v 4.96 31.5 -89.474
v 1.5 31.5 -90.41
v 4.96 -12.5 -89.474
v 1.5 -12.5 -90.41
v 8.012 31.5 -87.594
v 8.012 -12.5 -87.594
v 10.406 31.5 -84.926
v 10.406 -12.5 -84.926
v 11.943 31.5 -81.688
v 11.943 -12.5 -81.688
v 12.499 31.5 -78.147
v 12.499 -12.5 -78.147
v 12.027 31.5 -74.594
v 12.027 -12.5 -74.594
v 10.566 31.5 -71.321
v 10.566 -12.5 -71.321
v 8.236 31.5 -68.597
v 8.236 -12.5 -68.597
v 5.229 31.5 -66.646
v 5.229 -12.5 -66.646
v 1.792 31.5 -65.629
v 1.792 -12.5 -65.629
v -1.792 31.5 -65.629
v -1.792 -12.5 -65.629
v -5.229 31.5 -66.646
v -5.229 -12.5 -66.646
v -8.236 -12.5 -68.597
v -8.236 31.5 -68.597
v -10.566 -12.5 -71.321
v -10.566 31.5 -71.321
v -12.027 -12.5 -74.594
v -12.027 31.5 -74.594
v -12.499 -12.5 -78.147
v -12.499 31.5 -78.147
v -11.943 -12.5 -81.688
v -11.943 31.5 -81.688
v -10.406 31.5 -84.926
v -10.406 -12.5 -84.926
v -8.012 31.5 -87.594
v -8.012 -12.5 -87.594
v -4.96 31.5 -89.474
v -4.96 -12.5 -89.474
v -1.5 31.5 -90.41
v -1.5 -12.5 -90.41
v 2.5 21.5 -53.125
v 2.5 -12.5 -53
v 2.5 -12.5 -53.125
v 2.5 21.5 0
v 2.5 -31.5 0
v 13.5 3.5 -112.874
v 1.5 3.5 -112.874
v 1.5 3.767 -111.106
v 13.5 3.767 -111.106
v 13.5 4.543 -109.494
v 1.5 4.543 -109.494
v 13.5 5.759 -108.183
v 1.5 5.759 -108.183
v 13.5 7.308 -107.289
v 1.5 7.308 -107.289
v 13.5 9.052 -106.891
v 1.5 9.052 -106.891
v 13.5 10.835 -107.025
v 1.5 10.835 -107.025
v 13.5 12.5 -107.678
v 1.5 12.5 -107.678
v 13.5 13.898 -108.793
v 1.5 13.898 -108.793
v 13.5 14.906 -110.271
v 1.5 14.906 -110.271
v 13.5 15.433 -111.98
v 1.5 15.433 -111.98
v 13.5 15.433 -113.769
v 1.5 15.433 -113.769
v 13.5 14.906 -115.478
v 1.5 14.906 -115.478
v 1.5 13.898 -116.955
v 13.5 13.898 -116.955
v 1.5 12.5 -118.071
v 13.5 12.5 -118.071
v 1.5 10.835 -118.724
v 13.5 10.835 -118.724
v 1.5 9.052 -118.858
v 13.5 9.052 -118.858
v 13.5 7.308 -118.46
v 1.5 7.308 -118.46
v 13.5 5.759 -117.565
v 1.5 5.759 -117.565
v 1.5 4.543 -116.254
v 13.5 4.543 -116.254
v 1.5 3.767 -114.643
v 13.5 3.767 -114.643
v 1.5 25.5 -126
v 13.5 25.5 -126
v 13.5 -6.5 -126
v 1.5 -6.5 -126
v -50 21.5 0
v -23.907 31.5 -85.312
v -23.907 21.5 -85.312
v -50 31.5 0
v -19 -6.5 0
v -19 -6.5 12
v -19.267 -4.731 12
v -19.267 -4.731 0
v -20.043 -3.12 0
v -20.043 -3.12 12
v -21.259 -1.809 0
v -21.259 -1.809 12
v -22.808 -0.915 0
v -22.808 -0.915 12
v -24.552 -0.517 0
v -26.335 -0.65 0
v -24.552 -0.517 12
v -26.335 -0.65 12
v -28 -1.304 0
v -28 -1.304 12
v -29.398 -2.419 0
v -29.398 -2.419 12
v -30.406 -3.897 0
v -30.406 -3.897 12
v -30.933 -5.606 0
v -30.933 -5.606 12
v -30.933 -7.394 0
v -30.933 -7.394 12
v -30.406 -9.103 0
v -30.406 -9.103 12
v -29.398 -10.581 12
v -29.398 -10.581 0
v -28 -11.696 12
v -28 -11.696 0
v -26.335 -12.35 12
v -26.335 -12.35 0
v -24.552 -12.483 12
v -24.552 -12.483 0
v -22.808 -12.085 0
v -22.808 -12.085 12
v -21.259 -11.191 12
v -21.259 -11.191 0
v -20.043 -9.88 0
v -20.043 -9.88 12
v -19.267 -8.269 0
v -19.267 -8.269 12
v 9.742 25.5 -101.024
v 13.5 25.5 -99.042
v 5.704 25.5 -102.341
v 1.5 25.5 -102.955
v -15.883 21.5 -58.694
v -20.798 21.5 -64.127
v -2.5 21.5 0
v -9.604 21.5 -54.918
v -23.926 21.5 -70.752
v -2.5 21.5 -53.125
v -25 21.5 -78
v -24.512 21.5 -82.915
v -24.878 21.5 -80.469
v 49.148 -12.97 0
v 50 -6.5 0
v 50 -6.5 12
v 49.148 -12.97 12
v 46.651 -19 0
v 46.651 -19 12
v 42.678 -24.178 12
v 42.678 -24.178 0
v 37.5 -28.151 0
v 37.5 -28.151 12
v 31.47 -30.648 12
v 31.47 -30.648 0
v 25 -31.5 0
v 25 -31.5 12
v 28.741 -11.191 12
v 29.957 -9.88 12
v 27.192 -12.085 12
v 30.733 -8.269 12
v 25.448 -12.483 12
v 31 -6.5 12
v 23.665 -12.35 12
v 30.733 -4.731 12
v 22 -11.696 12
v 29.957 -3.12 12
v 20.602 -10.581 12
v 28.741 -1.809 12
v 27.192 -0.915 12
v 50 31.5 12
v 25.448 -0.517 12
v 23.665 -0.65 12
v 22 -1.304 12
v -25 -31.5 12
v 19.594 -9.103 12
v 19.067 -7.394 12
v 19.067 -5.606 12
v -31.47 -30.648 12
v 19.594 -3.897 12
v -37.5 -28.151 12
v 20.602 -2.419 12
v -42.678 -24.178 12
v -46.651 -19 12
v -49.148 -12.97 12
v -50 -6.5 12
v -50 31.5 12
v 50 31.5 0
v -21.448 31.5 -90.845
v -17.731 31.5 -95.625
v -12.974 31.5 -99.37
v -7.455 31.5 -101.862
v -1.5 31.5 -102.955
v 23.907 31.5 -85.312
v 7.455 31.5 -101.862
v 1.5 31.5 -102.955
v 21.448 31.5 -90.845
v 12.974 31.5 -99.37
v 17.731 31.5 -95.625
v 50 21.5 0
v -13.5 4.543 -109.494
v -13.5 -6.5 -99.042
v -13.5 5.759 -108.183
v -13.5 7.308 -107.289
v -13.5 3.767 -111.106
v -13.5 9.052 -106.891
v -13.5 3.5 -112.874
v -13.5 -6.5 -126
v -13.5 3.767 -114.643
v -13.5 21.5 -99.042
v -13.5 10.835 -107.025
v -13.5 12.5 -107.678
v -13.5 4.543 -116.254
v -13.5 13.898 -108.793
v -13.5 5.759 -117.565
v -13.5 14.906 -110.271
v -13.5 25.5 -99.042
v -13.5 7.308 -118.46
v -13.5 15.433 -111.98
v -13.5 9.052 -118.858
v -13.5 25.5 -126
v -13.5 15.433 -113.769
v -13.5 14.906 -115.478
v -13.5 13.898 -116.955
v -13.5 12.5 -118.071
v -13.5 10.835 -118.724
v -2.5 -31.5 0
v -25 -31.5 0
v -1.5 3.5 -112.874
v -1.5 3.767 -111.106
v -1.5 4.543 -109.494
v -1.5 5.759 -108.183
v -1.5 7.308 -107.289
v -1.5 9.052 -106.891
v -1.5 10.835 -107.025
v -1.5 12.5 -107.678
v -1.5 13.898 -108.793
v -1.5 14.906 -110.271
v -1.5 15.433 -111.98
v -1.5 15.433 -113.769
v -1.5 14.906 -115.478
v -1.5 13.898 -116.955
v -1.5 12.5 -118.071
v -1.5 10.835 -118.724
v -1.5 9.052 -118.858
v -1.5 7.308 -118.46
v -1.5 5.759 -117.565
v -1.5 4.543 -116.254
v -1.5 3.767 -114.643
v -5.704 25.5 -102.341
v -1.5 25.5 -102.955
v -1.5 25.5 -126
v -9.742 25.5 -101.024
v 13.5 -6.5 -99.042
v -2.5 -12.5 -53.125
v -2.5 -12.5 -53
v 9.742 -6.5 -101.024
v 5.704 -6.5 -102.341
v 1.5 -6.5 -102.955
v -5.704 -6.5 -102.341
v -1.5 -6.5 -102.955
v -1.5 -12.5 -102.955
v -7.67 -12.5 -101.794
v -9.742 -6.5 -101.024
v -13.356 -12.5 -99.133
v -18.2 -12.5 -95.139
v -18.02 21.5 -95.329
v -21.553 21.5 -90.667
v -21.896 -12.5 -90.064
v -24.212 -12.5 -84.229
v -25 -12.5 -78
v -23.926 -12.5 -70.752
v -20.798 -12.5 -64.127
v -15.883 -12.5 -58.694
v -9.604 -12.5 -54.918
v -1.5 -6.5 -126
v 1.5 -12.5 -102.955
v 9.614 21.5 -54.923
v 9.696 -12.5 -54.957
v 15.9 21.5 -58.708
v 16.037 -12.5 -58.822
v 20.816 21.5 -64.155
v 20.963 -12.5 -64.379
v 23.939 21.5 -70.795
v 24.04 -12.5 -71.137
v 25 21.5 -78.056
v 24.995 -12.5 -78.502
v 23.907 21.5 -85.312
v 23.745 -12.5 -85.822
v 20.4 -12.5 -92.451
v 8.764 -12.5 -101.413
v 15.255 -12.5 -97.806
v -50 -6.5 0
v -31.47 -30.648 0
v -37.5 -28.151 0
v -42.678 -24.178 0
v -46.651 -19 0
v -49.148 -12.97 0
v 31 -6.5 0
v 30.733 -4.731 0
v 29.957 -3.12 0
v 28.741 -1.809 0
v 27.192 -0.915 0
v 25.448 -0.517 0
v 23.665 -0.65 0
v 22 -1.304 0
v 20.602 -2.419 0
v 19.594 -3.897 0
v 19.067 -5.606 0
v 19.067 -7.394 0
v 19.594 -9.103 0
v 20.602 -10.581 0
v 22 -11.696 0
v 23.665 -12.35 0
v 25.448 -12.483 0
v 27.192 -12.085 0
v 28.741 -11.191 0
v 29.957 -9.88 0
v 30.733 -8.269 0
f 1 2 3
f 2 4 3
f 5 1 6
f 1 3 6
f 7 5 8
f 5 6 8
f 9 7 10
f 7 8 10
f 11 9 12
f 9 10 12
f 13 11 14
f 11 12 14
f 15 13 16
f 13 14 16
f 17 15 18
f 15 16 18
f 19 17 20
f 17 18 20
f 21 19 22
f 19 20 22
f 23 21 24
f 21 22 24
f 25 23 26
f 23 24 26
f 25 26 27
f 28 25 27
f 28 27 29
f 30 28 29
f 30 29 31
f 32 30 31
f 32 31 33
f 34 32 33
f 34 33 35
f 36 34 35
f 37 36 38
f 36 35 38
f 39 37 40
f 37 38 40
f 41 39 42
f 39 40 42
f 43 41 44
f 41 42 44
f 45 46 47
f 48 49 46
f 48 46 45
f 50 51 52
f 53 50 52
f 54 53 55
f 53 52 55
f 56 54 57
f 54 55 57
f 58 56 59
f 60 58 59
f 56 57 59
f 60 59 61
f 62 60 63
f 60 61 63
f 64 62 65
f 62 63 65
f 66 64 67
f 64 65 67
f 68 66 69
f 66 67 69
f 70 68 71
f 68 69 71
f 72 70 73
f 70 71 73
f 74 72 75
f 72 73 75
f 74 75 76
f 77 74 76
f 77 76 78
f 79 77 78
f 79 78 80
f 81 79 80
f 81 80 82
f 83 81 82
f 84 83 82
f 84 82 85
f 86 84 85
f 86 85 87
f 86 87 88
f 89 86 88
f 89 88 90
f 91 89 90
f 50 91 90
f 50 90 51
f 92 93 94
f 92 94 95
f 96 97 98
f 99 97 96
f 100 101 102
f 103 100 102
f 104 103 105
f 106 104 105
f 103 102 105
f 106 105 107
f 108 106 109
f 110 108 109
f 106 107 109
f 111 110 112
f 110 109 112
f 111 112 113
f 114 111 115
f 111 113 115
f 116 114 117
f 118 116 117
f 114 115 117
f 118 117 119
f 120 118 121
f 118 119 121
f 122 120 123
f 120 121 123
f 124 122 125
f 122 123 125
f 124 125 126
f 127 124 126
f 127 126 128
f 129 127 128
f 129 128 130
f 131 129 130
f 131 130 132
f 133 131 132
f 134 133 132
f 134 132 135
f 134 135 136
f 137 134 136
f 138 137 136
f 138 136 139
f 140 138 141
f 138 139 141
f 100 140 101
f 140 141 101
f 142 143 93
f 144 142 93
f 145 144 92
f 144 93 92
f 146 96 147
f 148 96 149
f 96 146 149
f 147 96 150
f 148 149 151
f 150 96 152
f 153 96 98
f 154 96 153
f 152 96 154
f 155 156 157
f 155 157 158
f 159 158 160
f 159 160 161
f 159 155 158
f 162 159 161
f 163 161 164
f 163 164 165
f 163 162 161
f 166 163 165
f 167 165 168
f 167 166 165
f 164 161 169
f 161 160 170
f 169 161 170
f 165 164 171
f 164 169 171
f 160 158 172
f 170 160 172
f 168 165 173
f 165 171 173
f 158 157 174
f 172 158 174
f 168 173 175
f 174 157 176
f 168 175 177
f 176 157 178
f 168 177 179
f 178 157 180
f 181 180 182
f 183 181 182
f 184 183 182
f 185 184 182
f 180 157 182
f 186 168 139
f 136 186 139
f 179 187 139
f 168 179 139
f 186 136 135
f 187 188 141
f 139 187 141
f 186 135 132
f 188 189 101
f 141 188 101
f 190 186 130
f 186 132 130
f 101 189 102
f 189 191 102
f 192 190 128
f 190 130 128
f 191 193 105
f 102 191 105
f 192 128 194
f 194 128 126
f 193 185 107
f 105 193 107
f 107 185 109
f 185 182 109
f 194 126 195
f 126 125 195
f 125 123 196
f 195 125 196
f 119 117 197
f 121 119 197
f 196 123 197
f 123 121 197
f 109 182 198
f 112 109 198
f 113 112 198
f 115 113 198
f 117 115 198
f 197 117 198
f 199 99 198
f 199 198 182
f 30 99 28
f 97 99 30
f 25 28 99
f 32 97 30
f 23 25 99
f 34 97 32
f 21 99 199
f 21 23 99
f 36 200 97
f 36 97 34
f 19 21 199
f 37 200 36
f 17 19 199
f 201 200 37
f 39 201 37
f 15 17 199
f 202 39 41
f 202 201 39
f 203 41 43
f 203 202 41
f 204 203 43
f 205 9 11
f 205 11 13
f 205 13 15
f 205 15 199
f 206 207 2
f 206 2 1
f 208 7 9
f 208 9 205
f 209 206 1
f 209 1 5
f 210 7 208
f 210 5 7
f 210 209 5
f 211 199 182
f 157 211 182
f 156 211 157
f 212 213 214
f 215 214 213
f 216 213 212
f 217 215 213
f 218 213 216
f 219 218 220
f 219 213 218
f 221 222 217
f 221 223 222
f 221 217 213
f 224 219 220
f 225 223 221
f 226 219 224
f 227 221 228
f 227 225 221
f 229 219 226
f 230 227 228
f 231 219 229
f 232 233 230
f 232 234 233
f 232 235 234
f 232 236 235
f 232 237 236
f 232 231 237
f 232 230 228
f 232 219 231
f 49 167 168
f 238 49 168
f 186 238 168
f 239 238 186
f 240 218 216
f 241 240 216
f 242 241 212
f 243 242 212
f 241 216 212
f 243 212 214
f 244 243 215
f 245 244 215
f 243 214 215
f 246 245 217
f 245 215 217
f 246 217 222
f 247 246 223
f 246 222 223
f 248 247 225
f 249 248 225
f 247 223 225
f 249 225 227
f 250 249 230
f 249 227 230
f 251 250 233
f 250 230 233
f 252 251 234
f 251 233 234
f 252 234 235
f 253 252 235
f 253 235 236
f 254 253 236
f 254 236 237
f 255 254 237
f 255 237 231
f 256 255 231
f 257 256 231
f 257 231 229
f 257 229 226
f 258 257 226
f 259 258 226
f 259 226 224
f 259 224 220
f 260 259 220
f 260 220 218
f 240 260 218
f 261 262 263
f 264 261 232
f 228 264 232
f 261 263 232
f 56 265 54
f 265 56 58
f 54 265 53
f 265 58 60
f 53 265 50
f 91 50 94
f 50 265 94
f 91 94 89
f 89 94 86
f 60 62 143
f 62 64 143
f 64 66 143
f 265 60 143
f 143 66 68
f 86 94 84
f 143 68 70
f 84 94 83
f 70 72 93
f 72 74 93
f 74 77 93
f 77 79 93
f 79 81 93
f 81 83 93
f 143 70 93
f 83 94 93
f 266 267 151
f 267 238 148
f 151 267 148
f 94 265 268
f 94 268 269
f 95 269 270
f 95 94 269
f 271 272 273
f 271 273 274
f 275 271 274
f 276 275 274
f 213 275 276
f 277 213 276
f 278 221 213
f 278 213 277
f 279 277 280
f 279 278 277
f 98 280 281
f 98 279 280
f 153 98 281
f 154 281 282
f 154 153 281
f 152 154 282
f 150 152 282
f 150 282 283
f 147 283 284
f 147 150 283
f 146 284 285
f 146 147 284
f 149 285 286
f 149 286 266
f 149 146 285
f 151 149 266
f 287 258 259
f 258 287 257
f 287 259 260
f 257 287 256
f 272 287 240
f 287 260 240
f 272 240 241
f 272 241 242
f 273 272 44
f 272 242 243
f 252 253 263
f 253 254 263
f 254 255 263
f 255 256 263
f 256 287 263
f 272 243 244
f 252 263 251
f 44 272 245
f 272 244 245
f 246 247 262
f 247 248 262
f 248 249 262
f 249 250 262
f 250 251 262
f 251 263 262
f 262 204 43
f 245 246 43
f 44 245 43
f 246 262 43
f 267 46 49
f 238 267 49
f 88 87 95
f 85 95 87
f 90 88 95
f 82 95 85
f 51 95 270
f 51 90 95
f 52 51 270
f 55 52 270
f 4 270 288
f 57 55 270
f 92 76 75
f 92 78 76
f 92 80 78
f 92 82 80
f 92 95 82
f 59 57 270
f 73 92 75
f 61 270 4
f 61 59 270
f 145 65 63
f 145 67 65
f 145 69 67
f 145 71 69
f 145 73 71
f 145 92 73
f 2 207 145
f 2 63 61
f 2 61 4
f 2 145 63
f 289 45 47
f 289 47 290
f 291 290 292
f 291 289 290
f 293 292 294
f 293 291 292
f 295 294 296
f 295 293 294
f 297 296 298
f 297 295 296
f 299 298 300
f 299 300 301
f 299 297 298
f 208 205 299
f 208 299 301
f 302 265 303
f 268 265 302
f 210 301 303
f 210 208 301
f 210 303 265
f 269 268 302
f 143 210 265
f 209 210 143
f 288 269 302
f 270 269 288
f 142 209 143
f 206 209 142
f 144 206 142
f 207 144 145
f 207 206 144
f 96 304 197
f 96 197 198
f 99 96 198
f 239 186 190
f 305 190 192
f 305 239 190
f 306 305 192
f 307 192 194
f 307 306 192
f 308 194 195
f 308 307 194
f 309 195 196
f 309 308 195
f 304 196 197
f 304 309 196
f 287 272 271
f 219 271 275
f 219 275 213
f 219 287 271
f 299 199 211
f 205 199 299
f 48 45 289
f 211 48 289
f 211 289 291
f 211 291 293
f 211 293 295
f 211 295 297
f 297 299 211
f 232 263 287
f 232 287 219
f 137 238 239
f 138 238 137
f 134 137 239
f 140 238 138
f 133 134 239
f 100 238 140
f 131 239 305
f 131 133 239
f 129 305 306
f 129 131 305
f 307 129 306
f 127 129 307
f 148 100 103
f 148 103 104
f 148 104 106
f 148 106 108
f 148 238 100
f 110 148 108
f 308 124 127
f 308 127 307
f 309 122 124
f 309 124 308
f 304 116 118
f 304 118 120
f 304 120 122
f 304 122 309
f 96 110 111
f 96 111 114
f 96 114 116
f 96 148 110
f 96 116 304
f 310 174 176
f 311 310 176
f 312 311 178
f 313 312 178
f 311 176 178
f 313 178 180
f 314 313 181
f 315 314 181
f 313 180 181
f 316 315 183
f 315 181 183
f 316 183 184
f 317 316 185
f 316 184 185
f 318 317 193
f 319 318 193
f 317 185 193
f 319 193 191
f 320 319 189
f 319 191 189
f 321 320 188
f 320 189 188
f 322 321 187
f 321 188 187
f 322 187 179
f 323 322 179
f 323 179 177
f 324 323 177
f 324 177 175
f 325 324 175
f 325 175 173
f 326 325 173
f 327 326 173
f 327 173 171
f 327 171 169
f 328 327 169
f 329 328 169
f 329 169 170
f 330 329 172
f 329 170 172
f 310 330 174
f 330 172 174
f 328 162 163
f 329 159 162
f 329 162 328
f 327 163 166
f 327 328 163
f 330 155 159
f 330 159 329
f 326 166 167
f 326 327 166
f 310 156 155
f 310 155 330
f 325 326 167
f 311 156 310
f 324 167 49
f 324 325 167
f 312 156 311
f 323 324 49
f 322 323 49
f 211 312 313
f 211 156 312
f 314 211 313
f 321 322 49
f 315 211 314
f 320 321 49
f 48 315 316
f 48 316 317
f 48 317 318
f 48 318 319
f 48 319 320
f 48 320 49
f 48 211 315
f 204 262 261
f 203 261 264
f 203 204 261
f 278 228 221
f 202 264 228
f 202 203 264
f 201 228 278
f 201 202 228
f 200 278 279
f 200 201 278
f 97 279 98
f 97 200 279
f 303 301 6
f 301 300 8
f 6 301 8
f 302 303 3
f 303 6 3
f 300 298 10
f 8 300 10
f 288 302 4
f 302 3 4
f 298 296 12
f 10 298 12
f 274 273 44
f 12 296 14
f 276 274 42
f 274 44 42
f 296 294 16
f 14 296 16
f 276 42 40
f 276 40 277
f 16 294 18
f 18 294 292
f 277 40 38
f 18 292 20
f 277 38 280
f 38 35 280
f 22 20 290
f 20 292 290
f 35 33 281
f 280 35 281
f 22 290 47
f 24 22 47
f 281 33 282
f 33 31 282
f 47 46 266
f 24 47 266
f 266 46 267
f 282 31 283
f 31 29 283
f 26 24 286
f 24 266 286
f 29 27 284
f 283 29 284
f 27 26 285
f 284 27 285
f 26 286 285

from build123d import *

# Parameters (mm, degrees)
BOSS_EXTRUDE1_DEPTH      = 12
SKETCH3_R                = 6
CUT_EXTRUDE1_DEPTH       = 12
BOSS_EXTRUDE2_DEPTH      = 10
SKETCH4_3_R              = 25
BOSS_EXTRUDE3_DEPTH      = 44
SKETCH6_R                = 12.5
CUT_EXTRUDE2_DEPTH       = 44
BOSS_EXTRUDE4_REACH      = 152.121
BOSS_EXTRUDE4_END_RADIUS = 25
SKETCH7_W                = 27
SKETCH7_H                = 32
CUT_EXTRUDE3_DEPTH       = 143.520174011
CUT_EXTRUDE3_DEPTH_BACK  = 44
SKETCH8_W                = 3
SKETCH8_H                = 53.670936702
SKETCH9_R                = 6
CUT_EXTRUDE4_DEPTH       = 44
BOSS_EXTRUDE8_DEPTH      = 2.5
BOSS_EXTRUDE9_REACH      = 95.922
BOSS_EXTRUDE9_END_RADIUS = 25
SKETCH11_W               = 5
SKETCH11_H               = 34


with BuildPart() as part:
    # Sketch1 → Boss-Extrude1 (new body)
    with BuildSketch(Plane.XY):
        with BuildLine():
            Line((25, -31.5), (-25, -31.5))
            ThreePointArc((-25, -31.5), (-42.67766953, -24.17766953), (-50, -6.5))
            Line((-50, -6.5), (-50, 31.5))
            Line((-50, 31.5), (50, 31.5))
            Line((50, 31.5), (50, -6.5))
            ThreePointArc((50, -6.5), (42.67766953, -24.17766953), (25, -31.5))
        make_face()
    extrude(amount=BOSS_EXTRUDE1_DEPTH)

    # Sketch3 → Cut-Extrude1 (cut)
    with BuildSketch(Plane.XY.offset(12)):
        with Locations((-25, -6.5)):
            Circle(SKETCH3_R)
        with Locations((25, -6.5)):
            Circle(SKETCH3_R)
    extrude(amount=-CUT_EXTRUDE1_DEPTH, mode=Mode.SUBTRACT)

    # Sketch4 → Boss-Extrude2 (add)
    with BuildSketch(Plane(origin=(0, 31.5, 0), x_dir=(1, 0, 0), z_dir=(0, 1, 0))):
        with BuildLine():
            Line((-50, 0), (50, 0))
            Line((50, 0), (23.906779363, 85.312038053))
            ThreePointArc((23.906779363, 85.312038053), (0, 103), (-23.906779363, 85.312038053))
            Line((-23.906779363, 85.312038053), (-50, 0))
        make_face()
    extrude(amount=-BOSS_EXTRUDE2_DEPTH)

    # Sketch4<3> → Boss-Extrude3 (add)
    with BuildSketch(Plane(origin=(0, 31.5, 0), x_dir=(1, 0, 0), z_dir=(0, 1, 0))):
        with Locations(Location((0, 78, 0), (0, 0, 180))):
            Circle(SKETCH4_3_R)
    extrude(amount=-BOSS_EXTRUDE3_DEPTH)

    # Sketch6 → Cut-Extrude2 (cut)
    with BuildSketch(Plane.XZ.offset(12.5)):
        with Locations((0, -78)):
            Circle(SKETCH6_R)
    extrude(amount=-CUT_EXTRUDE2_DEPTH, mode=Mode.SUBTRACT)

    # Boss-Extrude4: up to this cylinder (the profile starts outside it)
    boss_extrude4_end = Plane(origin=(0, 9.5, -78), z_dir=(0, 1, 0)) * Cylinder(BOSS_EXTRUDE4_END_RADIUS, 355.242, mode=Mode.PRIVATE)
    # Sketch7 → Boss-Extrude4 (add, up to the surface)
    with BuildSketch(Plane(origin=(0, 0, -126), x_dir=(-1, 0, 0), z_dir=(0, 0, -1)), mode=Mode.PRIVATE) as boss_extrude4_sk1:
        with Locations((0, 9.5)):
            Rectangle(SKETCH7_W, SKETCH7_H)
    boss_extrude4_tool1 = extrude(boss_extrude4_sk1.sketch, amount=-BOSS_EXTRUDE4_REACH, mode=Mode.PRIVATE) - boss_extrude4_end
    add(boss_extrude4_tool1.solids().sort_by_distance((0, 9.5, -126))[0])

    # Sketch8 → Cut-Extrude3 (cut, two sides: drawn at the far end of the back side and taken through both)
    with BuildSketch(Plane.XZ.offset(12.5).offset(-CUT_EXTRUDE3_DEPTH_BACK)):
        with Locations((0, -99.480094591)):
            Rectangle(SKETCH8_W, SKETCH8_H)
    extrude(amount=CUT_EXTRUDE3_DEPTH + CUT_EXTRUDE3_DEPTH_BACK, mode=Mode.SUBTRACT)

    # Sketch9 → Cut-Extrude4 (cut)
    with BuildSketch(Plane.ZY.offset(13.5)):
        with Locations(Location((-112.874414164, 9.5, 0), (0, 0, 270))):
            Circle(SKETCH9_R)
    extrude(amount=-CUT_EXTRUDE4_DEPTH, mode=Mode.SUBTRACT)



with BuildPart() as body_2:
    # Sketch10 → Boss-Extrude8 (new, symmetric)
    with BuildSketch(Plane(origin=(0, 0, 0), x_dir=(0, 0, -1), z_dir=(1, 0, 0))):
        Polygon((53, -12.5), (0, -31.5), (0, 21.5), (53, 21.5), align=None)
    extrude(amount=BOSS_EXTRUDE8_DEPTH, both=True)


with BuildPart() as part_1:
    add(part.part)

    add(body_2.part)  # Boss-Extrude9 merges body 2
    # Boss-Extrude9: up to this cylinder (the profile starts outside it)
    boss_extrude9_end = Plane(origin=(0, 4.5, -78), z_dir=(0, 1, 0)) * Cylinder(BOSS_EXTRUDE9_END_RADIUS, 242.844, mode=Mode.PRIVATE)
    # Sketch11 → Boss-Extrude9 (add, up to the surface)
    with BuildSketch(Plane(origin=(0, 0, -53), x_dir=(-1, 0, 0), z_dir=(0, 0, -1)), mode=Mode.PRIVATE) as boss_extrude9_sk1:
        with Locations((0, 4.5)):
            Rectangle(SKETCH11_W, SKETCH11_H)
    boss_extrude9_tool1 = extrude(boss_extrude9_sk1.sketch, amount=BOSS_EXTRUDE9_REACH, mode=Mode.PRIVATE) - boss_extrude9_end
    add(boss_extrude9_tool1.solids().sort_by_distance((0, 4.5, -53))[0])
    add(boss_extrude9_tool1.solids().sort_by_distance((0, 4.5, -53))[1])


solid = part_1.part
